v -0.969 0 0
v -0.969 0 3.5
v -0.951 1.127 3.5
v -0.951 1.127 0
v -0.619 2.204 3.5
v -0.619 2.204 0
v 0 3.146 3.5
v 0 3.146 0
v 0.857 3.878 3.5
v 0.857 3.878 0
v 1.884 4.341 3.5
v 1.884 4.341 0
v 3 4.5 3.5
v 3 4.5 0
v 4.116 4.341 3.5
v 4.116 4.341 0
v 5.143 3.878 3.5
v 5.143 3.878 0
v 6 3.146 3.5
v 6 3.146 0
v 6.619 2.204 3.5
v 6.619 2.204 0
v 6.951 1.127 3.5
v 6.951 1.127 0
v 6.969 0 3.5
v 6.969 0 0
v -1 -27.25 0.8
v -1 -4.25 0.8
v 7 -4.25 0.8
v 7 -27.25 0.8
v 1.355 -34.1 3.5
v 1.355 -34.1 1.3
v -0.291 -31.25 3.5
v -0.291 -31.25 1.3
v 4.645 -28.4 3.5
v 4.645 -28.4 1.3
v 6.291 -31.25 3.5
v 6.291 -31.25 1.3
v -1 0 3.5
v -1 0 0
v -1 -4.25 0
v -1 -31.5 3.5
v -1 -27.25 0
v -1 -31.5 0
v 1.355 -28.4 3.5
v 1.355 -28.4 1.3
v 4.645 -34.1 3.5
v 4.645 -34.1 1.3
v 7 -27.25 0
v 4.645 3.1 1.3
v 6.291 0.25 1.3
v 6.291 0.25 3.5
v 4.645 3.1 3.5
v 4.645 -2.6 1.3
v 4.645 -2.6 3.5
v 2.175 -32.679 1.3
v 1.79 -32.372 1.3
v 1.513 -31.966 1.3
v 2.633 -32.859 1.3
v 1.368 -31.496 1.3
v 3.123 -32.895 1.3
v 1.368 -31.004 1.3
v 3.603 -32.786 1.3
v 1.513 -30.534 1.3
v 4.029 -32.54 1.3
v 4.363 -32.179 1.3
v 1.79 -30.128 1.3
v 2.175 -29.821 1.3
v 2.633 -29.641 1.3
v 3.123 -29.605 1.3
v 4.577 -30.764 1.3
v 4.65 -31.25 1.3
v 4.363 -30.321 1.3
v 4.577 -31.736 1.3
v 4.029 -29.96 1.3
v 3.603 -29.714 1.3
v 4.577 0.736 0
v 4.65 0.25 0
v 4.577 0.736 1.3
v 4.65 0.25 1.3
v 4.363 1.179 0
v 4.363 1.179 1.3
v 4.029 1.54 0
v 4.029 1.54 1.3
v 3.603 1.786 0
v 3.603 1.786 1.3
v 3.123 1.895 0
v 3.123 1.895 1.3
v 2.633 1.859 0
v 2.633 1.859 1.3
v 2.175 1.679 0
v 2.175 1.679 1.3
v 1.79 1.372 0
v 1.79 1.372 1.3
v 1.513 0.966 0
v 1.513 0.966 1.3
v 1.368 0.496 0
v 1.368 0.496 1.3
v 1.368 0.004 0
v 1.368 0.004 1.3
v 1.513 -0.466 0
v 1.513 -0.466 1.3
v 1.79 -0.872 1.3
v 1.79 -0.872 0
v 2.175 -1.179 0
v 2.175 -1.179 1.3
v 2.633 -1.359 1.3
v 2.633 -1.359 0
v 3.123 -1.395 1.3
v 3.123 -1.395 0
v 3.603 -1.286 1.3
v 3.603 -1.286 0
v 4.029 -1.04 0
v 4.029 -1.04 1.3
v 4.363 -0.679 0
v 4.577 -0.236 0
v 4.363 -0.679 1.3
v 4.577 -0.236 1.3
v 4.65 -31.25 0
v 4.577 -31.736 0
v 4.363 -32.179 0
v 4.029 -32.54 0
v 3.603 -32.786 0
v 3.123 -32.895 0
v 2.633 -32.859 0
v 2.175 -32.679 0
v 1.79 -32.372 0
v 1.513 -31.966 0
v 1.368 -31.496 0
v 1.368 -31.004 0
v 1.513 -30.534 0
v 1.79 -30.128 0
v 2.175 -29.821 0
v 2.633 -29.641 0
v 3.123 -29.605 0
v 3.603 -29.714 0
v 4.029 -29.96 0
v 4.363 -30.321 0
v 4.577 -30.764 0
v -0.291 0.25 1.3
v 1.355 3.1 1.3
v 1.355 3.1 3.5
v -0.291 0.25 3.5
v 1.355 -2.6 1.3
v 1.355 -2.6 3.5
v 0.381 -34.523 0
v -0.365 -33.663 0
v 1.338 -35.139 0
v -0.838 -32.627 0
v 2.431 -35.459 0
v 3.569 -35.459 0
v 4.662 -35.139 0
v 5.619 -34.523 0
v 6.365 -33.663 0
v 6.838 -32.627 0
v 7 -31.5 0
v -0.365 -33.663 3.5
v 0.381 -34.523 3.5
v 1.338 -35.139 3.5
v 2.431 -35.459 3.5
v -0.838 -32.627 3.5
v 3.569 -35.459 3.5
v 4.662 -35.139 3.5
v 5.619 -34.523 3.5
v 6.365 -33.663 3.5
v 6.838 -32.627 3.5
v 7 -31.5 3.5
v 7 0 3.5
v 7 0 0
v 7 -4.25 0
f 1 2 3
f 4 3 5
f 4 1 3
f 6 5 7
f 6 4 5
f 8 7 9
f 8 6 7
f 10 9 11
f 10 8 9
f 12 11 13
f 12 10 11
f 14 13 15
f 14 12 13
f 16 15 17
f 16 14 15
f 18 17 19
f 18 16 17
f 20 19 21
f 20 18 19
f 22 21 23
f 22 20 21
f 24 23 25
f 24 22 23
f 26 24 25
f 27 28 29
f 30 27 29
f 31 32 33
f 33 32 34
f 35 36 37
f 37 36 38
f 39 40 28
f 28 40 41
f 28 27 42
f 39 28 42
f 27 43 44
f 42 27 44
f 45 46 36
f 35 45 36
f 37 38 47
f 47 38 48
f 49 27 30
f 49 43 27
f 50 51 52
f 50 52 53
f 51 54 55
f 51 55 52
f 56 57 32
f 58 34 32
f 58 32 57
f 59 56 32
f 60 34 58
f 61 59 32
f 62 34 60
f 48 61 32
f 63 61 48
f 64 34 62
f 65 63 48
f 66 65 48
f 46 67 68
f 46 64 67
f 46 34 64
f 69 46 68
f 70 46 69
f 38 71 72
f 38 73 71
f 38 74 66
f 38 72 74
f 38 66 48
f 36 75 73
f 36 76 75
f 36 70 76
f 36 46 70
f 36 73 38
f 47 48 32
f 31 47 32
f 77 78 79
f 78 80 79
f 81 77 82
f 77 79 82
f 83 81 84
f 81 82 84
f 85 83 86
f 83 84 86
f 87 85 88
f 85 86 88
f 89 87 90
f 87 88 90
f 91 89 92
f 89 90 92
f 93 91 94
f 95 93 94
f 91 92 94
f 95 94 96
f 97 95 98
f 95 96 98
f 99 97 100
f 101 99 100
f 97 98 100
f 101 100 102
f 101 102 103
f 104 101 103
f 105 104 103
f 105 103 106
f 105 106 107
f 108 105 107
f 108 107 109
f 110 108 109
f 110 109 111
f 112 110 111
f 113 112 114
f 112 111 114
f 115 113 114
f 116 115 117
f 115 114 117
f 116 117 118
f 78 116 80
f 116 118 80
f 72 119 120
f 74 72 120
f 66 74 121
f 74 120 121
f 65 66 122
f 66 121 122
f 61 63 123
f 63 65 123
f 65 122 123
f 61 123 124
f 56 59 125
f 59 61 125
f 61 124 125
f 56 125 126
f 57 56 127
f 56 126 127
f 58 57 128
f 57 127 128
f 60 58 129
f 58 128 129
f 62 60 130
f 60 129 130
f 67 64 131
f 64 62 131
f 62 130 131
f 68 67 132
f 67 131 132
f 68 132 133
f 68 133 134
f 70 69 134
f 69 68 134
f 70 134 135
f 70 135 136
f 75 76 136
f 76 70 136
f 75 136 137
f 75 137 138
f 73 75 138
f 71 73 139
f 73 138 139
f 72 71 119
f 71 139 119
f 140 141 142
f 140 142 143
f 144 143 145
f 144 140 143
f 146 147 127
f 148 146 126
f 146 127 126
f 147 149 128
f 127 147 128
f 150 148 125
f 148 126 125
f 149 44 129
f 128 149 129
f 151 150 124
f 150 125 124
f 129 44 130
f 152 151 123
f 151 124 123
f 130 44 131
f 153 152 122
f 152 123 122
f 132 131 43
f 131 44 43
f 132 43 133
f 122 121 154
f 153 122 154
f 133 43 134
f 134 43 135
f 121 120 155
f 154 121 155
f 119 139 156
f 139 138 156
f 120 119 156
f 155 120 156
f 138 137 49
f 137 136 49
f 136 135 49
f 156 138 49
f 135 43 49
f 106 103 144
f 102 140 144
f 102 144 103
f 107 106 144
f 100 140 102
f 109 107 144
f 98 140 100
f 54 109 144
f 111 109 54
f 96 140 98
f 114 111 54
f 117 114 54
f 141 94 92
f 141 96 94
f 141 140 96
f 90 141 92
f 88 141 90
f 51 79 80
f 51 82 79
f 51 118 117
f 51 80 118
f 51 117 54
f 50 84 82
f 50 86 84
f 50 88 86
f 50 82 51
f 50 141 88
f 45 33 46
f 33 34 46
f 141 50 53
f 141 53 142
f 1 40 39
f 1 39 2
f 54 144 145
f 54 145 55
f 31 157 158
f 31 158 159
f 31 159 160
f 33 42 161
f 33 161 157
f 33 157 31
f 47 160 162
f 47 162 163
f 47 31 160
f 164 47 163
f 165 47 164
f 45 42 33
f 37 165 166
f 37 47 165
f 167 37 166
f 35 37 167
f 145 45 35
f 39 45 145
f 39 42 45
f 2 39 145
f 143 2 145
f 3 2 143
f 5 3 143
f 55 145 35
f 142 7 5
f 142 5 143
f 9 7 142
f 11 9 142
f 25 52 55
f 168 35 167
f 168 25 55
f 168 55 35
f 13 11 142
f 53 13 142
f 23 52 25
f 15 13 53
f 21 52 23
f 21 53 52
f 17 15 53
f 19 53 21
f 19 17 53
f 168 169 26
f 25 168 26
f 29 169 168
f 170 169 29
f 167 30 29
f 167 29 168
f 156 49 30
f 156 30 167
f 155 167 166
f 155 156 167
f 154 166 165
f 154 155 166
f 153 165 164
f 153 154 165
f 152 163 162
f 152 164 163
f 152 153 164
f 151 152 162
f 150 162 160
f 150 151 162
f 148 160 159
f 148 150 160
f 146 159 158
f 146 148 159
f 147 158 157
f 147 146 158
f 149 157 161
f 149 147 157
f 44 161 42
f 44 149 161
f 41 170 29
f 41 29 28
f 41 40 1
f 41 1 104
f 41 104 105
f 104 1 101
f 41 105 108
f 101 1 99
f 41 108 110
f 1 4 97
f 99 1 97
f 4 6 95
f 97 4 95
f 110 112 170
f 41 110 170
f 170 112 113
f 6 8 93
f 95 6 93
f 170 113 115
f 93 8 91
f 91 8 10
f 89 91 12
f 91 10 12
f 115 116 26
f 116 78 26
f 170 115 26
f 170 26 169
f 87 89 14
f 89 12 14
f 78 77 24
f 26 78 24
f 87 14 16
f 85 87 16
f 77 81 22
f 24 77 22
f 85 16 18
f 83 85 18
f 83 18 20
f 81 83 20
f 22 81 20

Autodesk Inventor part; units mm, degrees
ref_plane "YZ Plane" through (0, 0, 0) normal (1, 0, 0) x (0, 1, 0)
ref_plane "XZ Plane" through (0, 0, 0) normal (0, 1, 0) x (-1, 0, 0)
ref_plane "XY Plane" through (0, 0, 0) normal (0, 0, 1) x (1, 0, 0)
sketch "Эскиз1" plane through (0, 0, 0) normal (0, 0, 1) x (1, 0, 0)
  line L0 (-7.5, -27.25) -> (-4, -27.25) projected
  line L1 (-4, -27.25) -> (-4, -32.25) projected
  line L2 (-4, -32.25) -> (-1.5, -32.25) projected
  line L3 (-1.5, -32.25) -> (-1.5, -27.25) projected
  line L4 (-1.5, -27.25) -> (7.5, -27.25) projected
  line L5 (7.5, -4.25) -> (7.5, -27.25) projected
  line L6 (7.5, -4.25) -> (-1.5, -4.25) projected
  line L7 (-1.5, -4.25) -> (-1.5, 0.75) projected
  line L8 (-1.5, 0.75) -> (-4, 0.75) projected
  line L9 (-4, 0.75) -> (-4, -4.25) projected
  line L10 (-4, -4.25) -> (-7.5, -4.25) projected
  line L11 (-7.5, -27.25) -> (-7.5, -4.25) projected
  line L12 (7.5, 0) -> (6.75, 0)
  line L13 (7, 0) -> (7, -31.5)
  line L14 (-1, 0) -> (3, 0)
  arc A0 (-1, -31.5) -> (7, -31.5) centre (3, -31.5) ccw
  line L15 (-1, 0) -> (-1, -31.5)
  line L16 (7, 0) -> (7, 0.5)
  line L17 (-1, 0) -> (-1, 0.5)
  arc A1 (6.9686, 0) -> (-0.9686, 0) centre (3, 0.5) ccw
  line L18 (-1, 0) -> (-0.9686, 0)
  line L19 (6.9686, 0) -> (7, 0)
  point P0 (0, 0)
  point P1 (6.9686, 0)
  dimension "d15" = 4
  dimension "d25" = 31.5
  dimension "d26" = 0.5
  dimension "d27" = 0.5
extrude "Выдавливание1" add sketch "Эскиз1" along normal blind 3.5 contours L15 L6 L13 L4 | L4 L13 A0 L15 | L15 L14 A1 L12 L13 L6
sketch "Эскиз2" plane through (0, 0, 3.5) normal (0, 0, 1) x (1, 0, 0)
  line L0 (-7.5, -27.25) -> (-4, -27.25) projected
  line L1 (-4, -27.25) -> (-4, -32.25) projected
  line L2 (-4, -32.25) -> (-1.5, -32.25) projected
  line L3 (-1.5, -32.25) -> (-1.5, -27.25) projected
  line L4 (-1.5, -27.25) -> (7.5, -27.25) projected
  line L5 (7.5, -4.25) -> (7.5, -27.25) projected
  line L6 (7.5, -4.25) -> (-1.5, -4.25) projected
  line L7 (-1.5, -4.25) -> (-1.5, 0.75) projected
  line L8 (-1.5, 0.75) -> (-4, 0.75) projected
  line L9 (-4, 0.75) -> (-4, -4.25) projected
  line L10 (-4, -4.25) -> (-7.5, -4.25) projected
  line L11 (-7.5, -27.25) -> (-7.5, -4.25) projected
  line L12 (-1.5, -4.25) -> (7.5, -4.25)
  line L13 (7, -31.5) -> (7, 0) projected
  point P0 (0, 0)
sketch "Эскиз4" plane through (0, 0, 0) normal (0, 0, 1) x (1, 0, 0)
  line L0 (-0.2909, -31.25) -> (1.3546, -28.4) projected
  line L1 (1.3546, -28.4) -> (4.6454, -28.4) projected
  line L2 (4.6454, -28.4) -> (6.2909, -31.25) projected
  line L3 (6.2909, -31.25) -> (4.6454, -34.1) projected
  line L4 (4.6454, -34.1) -> (1.3546, -34.1) projected
  line L5 (1.3546, -34.1) -> (-0.2909, -31.25) projected
  arc A0 (-1, -31.5) -> (7, -31.5) centre (3, -31.5) ccw projected
  line L6 (-0.2909, 0.25) -> (1.3546, -2.6)
  line L7 (1.3546, -2.6) -> (4.6454, -2.6)
  line L8 (4.6454, -2.6) -> (6.2909, 0.25)
  line L9 (6.2909, 0.25) -> (4.6454, 3.1)
  line L10 (4.6454, 3.1) -> (1.3546, 3.1)
  line L11 (1.3546, 3.1) -> (-0.2909, 0.25)
  circle A1 centre (3, -31.25) radius 1.65
  circle A2 centre (3, 0.25) radius 1.65
  point P0 (0, 0)
sketch "Эскиз5" plane through (0, 0, 0) normal (0, 0, 1) x (1, 0, 0)
  circle A0 centre (3, 0.25) radius 1.65 projected
  circle A1 centre (3, -31.25) radius 1.65 projected
  line L0 (-1, 0) -> (-1, -31.5) projected
  arc A2 (-1, -31.5) -> (7, -31.5) centre (3, -31.5) ccw projected
  line L1 (7, -31.5) -> (7, 0) projected
  line L2 (6.2909, -31.25) -> (4.6454, -34.1) projected
  line L3 (4.6454, -34.1) -> (1.3546, -34.1) projected
  line L4 (1.3546, -34.1) -> (-0.2909, -31.25) projected
  line L5 (4.6454, -34.1) -> (1.3546, -34.1) projected
  line L6 (6.2909, -31.25) -> (4.6454, -34.1) projected
  line L7 (4.6454, -28.4) -> (6.2909, -31.25) projected
  line L8 (1.3546, -28.4) -> (4.6454, -28.4) projected
  line L9 (-0.2909, -31.25) -> (1.3546, -28.4) projected
  circle A3 centre (3, -31.25) radius 1.65
  line L10 (3, -15.75) -> (0.5318, -15.75)
  line L11 (7, 0) -> (6.9686, 0) projected
  arc A4 (6.9686, 0) -> (-0.9686, 0) centre (3, 0.5) ccw projected
  line L12 (-0.9686, 0) -> (-1, 0) projected
  point P0 (0, 0)
  dimension "d24" = 3.3
extrude "Выдавливание5" cut sketch "Эскиз5" along normal through all contours A0 | A1
sketch "Эскиз6" plane through (0, 0, 0) normal (0, 0, 1) x (1, 0, 0)
  line L0 (7.5, -4.25) -> (-1.5, -4.25) projected
  line L1 (-1.5, -27.25) -> (7.5, -27.25) projected
  line L2 (-1, 0) -> (-1, -31.5) projected
  line L3 (7, -31.5) -> (7, 0) projected
  line L4 (-1, -4.25) -> (7, -4.25)
  line L5 (7, -4.25) -> (7, -27.25)
  line L6 (7, -27.25) -> (-1, -27.25)
  line L7 (-1, -27.25) -> (-1, -4.25)
  point P0 (0, 0)
  point P1 (-1, -27.25)
extrude "Выдавливание6" cut sketch "Эскиз6" along normal blind 0.8
extrude "Выдавливание7" cut sketch "Эскиз4" along normal through all contours L0 L1 L2 L3 L4 L5 | L11 L10 L9 L8 L7 L6 | A1 | A2
sketch "Эскиз7" plane through (0, 0, 3.5) normal (0, 0, 1) x (1, 0, 0)
  line L0 (-0.2909, -31.25) -> (1.3546, -28.4) projected
  line L1 (1.3546, -28.4) -> (4.6454, -28.4) projected
  line L2 (1.3546, -34.1) -> (-0.2909, -31.25) projected
  line L3 (4.6454, -28.4) -> (6.2909, -31.25) projected
  line L4 (6.2909, -31.25) -> (4.6454, -34.1) projected
  line L5 (4.6454, -34.1) -> (1.3546, -34.1) projected
  line L6 (-1, -4.25) -> (-1, -27.25) projected
  line L7 (7, -27.25) -> (7, -4.25) projected
  line L8 (-1, -27.25) -> (-1, -15.5)
  line L9 (-1, 0) -> (-1, -31.5) projected
  line L10 (-1, -15.5) -> (4.3528, -15.5)
  line L11 (-0.2909, 0.25) -> (1.3546, -2.6)
  line L12 (1.3546, -2.6) -> (4.6454, -2.6)
  line L13 (1.3546, 3.1) -> (-0.2909, 0.25)
  line L14 (4.6454, -2.6) -> (6.2909, 0.25)
  line L15 (6.2909, 0.25) -> (4.6454, 3.1)
  line L16 (4.6454, 3.1) -> (1.3546, 3.1)
  point P0 (-1, 0.5)
  dimension "d31" = 11.75
extrude "Выдавливание8" cut sketch "Эскиз7" against normal blind 2.2
extrude "Выдавливание9" add sketch "Эскиз4" along normal blind 1.3 contours L0 L1 L2 L3 L4 L5 | L11 L10 L9 L8 L7 L6 | A2
sketch "Эскиз8" plane through (0, 0, 1.3) normal (0, 0, 1) x (1, 0, 0)
  circle A0 centre (3, 0.25) radius 1.65 projected
  point P0 (0, 0)
extrude "Выдавливание10" cut sketch "Эскиз8" against normal through all
properties part number "крышка_держалка_серво_брови"
